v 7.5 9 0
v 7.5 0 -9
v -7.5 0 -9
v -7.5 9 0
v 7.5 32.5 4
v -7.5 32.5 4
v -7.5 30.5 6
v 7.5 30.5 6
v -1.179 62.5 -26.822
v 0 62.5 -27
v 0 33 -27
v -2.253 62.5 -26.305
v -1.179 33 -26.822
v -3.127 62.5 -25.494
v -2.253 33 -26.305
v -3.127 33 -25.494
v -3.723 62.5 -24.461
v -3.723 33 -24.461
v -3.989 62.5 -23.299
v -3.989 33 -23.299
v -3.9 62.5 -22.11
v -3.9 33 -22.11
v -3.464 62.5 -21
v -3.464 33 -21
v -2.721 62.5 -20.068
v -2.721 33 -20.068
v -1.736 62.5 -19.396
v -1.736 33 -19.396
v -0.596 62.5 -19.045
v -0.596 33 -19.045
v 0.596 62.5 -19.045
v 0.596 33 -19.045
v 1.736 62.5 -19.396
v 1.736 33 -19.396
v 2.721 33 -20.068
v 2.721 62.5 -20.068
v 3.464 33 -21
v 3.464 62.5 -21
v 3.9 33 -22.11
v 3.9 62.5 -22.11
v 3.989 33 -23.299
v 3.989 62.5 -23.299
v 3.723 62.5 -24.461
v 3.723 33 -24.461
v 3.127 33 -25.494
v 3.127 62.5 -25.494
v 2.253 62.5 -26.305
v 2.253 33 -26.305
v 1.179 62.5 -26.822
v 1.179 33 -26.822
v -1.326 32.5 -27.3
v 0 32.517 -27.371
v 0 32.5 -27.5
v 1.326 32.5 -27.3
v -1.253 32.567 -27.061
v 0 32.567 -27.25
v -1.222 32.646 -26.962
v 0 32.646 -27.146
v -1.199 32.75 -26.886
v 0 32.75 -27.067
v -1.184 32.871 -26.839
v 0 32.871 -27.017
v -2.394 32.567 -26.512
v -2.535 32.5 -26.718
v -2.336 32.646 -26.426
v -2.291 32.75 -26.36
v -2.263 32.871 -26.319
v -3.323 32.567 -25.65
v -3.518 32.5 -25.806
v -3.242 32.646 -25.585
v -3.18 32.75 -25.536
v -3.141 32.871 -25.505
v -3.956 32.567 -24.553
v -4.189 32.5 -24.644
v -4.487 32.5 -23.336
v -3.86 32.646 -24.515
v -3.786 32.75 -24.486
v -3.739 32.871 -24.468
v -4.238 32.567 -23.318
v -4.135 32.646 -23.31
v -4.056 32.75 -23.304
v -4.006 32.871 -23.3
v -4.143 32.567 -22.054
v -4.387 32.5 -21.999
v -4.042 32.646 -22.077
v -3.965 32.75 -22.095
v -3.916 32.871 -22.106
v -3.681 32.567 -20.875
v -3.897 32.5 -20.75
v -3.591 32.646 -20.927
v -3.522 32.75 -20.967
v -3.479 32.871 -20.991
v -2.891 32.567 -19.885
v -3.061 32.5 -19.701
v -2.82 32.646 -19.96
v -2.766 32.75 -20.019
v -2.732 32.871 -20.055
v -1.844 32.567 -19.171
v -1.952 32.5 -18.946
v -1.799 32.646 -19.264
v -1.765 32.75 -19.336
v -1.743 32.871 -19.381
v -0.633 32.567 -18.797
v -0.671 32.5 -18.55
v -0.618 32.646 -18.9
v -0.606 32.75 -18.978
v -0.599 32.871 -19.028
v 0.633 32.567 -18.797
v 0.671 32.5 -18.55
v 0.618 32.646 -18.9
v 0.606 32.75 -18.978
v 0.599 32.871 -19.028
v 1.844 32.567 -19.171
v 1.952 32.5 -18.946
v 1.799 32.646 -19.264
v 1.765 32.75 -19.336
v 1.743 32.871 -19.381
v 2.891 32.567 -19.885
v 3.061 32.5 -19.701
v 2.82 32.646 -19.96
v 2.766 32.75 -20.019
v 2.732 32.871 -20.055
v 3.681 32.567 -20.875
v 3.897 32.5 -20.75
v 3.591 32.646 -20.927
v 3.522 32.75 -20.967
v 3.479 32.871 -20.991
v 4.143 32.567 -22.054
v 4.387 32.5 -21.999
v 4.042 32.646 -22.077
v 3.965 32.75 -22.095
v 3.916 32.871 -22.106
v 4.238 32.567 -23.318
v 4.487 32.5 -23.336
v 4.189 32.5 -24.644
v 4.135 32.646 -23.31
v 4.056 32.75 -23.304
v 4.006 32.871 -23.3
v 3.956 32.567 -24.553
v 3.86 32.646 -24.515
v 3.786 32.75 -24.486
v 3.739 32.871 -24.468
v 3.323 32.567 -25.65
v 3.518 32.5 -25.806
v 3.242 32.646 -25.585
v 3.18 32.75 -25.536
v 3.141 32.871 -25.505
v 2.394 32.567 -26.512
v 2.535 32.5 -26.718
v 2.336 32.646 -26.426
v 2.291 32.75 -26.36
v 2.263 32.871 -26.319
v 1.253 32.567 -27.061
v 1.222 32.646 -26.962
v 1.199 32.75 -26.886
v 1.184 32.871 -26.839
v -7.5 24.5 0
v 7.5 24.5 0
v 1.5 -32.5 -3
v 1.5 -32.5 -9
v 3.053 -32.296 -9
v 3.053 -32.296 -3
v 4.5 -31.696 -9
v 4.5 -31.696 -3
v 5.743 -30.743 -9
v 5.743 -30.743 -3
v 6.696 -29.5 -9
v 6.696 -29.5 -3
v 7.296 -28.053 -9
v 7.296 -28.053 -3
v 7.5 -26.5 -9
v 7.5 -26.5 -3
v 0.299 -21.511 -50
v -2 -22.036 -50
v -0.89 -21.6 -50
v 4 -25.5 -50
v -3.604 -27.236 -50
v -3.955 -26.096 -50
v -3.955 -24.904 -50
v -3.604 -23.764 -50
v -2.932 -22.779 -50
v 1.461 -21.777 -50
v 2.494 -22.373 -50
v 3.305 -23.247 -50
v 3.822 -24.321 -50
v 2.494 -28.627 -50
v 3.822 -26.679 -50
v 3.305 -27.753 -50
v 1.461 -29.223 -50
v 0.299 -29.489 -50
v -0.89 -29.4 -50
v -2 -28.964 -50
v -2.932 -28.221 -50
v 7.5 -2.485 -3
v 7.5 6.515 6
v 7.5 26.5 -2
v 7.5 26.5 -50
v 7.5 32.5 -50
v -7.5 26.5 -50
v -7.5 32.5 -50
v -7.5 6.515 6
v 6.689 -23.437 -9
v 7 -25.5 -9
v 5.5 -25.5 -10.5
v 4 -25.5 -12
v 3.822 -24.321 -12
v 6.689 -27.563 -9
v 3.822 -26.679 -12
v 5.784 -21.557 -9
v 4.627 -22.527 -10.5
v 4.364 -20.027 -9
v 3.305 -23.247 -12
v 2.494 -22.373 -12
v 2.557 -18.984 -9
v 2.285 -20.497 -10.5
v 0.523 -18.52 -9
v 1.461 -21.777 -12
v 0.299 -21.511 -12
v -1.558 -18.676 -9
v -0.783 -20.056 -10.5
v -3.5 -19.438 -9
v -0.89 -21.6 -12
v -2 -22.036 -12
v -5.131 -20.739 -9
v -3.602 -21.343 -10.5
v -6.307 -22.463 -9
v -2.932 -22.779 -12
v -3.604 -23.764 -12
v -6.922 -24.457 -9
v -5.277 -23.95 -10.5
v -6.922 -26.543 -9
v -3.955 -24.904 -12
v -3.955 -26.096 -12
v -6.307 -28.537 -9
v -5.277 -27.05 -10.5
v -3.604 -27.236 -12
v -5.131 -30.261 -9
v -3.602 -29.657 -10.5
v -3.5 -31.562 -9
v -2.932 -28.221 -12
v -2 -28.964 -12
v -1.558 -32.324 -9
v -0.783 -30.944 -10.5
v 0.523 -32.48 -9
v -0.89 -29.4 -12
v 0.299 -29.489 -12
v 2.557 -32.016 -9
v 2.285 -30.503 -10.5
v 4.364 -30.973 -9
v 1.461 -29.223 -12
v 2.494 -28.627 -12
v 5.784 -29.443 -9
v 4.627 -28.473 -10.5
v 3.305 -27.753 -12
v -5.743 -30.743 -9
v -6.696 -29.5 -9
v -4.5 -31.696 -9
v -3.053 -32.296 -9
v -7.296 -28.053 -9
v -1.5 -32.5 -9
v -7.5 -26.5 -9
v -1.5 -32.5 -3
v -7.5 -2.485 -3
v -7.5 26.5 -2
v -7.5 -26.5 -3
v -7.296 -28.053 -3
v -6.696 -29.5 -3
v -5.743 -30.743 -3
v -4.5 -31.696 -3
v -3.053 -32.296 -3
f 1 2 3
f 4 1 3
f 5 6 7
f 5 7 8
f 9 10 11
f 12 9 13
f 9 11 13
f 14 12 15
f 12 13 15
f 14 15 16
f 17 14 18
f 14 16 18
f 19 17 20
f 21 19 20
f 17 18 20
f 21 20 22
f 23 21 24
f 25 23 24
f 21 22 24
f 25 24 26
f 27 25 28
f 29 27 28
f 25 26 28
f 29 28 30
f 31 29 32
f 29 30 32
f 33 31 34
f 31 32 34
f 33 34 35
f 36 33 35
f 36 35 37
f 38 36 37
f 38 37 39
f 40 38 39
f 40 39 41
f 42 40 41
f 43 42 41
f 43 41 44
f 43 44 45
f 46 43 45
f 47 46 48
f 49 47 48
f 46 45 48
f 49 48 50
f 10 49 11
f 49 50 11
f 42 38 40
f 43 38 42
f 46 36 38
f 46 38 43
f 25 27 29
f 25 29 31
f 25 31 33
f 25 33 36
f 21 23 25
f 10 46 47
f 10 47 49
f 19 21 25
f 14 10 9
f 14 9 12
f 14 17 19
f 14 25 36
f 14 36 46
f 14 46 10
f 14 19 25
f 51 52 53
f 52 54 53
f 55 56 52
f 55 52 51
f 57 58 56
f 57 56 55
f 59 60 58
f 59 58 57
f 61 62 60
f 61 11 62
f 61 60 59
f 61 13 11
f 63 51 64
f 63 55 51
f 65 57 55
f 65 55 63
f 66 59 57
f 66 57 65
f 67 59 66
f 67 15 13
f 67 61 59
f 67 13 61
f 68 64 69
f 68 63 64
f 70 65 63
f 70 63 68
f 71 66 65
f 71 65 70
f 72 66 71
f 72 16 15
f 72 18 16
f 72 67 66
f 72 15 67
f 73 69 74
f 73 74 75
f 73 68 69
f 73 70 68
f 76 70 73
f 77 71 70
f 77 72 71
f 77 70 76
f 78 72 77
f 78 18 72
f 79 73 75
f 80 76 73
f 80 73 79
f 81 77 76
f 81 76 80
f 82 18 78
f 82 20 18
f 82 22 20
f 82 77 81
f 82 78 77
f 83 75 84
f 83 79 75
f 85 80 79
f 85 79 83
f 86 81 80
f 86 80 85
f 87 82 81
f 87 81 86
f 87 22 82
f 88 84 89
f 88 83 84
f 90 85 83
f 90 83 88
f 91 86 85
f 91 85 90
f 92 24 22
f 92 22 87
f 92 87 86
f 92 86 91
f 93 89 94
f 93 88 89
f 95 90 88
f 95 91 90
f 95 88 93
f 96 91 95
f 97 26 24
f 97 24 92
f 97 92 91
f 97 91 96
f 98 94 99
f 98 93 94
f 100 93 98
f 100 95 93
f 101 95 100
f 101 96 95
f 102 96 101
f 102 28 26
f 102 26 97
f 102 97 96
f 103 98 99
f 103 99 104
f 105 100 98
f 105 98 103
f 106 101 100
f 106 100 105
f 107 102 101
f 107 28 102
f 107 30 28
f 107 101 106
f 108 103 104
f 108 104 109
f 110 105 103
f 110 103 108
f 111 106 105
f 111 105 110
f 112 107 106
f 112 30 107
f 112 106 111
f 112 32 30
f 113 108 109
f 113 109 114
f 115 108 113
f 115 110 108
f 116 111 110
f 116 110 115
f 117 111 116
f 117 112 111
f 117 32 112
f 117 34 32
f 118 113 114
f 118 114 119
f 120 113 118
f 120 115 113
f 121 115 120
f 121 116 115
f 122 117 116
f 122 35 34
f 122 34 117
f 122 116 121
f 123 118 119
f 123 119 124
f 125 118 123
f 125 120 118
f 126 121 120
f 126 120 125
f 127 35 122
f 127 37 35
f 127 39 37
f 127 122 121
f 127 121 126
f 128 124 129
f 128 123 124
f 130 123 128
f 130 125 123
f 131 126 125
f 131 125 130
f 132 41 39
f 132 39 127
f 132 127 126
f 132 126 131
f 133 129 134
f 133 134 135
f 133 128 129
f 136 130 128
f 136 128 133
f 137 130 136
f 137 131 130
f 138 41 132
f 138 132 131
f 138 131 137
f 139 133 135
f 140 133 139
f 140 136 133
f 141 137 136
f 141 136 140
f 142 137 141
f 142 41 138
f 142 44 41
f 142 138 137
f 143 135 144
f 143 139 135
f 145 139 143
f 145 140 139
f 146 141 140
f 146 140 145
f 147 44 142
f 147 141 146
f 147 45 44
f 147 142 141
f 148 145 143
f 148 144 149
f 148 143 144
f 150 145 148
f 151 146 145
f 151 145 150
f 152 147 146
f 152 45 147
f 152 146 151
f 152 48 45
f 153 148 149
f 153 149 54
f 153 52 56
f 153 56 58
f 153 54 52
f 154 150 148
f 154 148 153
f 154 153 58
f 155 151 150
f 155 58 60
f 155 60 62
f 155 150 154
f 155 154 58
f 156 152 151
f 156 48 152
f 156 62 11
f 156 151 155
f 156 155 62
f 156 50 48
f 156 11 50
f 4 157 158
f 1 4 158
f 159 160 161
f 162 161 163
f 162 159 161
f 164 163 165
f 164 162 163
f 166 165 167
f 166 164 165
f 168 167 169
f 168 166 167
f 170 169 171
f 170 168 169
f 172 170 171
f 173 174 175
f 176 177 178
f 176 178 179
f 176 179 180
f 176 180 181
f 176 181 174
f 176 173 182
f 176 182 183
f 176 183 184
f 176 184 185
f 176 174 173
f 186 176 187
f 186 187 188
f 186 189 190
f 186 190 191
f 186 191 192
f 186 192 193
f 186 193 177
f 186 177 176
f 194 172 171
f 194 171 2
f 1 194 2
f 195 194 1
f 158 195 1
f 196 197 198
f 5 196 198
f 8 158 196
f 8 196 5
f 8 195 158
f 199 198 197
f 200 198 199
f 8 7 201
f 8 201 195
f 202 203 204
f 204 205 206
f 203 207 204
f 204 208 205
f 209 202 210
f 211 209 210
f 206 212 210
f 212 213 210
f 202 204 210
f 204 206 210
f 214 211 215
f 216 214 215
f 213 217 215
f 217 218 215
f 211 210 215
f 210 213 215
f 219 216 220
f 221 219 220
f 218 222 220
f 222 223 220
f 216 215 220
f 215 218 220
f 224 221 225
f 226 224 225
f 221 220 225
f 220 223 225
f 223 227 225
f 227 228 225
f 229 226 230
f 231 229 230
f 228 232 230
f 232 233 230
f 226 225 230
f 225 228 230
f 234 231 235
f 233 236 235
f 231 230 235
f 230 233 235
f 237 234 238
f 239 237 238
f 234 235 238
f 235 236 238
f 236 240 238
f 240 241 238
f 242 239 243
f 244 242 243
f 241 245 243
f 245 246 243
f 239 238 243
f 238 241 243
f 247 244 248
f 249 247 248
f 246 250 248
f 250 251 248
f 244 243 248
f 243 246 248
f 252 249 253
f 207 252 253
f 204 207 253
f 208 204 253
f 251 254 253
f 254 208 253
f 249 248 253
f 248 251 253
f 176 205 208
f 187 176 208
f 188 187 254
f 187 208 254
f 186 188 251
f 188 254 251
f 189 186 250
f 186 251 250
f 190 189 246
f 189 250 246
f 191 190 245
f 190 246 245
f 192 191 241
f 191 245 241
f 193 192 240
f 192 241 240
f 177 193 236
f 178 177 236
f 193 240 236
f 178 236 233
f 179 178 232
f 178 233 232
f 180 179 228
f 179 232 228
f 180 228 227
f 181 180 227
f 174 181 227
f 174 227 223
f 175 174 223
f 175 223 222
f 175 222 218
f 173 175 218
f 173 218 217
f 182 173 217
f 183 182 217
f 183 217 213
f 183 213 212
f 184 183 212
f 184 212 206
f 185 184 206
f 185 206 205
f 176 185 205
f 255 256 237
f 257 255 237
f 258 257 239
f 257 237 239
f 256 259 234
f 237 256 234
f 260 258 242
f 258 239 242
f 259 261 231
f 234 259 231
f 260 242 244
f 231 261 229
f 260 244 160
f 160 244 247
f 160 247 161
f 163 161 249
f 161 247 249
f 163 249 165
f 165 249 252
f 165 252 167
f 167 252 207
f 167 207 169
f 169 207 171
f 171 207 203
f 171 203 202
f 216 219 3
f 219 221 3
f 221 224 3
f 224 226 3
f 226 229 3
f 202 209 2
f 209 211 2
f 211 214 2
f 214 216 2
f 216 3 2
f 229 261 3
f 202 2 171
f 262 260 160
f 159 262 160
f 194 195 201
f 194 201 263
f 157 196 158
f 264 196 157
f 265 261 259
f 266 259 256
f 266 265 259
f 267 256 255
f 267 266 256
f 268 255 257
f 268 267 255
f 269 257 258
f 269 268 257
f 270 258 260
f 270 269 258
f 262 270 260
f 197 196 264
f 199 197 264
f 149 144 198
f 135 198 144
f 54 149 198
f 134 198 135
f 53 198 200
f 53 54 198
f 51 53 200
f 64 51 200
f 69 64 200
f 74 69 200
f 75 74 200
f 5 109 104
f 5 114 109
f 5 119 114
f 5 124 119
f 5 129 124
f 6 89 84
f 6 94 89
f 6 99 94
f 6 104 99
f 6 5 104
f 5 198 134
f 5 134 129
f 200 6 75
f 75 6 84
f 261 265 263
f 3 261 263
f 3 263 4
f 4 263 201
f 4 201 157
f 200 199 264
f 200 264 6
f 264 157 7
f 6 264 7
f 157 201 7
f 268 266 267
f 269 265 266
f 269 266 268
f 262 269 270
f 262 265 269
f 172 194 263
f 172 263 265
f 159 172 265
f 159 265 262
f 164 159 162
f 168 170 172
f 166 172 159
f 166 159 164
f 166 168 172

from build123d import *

# Parameters (mm, degrees)
CROQUIS1_W     = 15
CROQUIS1_H     = 65
EXTRUIR1_DEPTH = 6
CROQUIS2_W     = 15
CROQUIS2_H     = 6
EXTRUIR2_DEPTH = 50
CHAFL_N1_SIZE  = 2
CROQUIS3_R     = 4
EXTRUIR3_DEPTH = 50
CHAFL_N2_SIZE  = 3
REDONDEO1_R    = 6
CROQUIS4_R     = 4
EXTRUIR4_DEPTH = 30
REDONDEO2_R    = 0.5
EXTRUIR5_DEPTH = 15
CHAFL_N3_SIZE  = 9
EXTRUIR6_DEPTH = 15
CHAFL_N4_SIZE  = 3


with BuildPart() as part:
    # Croquis1 → Extruir1 (new body)
    with BuildSketch(Plane.XY):
        Rectangle(CROQUIS1_W, CROQUIS1_H)
    extrude(amount=EXTRUIR1_DEPTH)

    # Croquis2 → Extruir2 (add)
    with BuildSketch(Plane(origin=(0, 0, 0), x_dir=(-1, 0, 0), z_dir=(0, 0, -1))):
        with Locations((0, 29.5)):
            Rectangle(CROQUIS2_W, CROQUIS2_H)
    extrude(amount=EXTRUIR2_DEPTH)

    # Chaflán1
    chafl_n1_edges = [part.edges().sort_by_distance(p)[0] for p in [
        (0, 32.5, 6),
        (0, 26.5, 0),
    ]]
    chamfer(chafl_n1_edges, length=CHAFL_N1_SIZE)

    # Croquis3 → Extruir3 (add)
    with BuildSketch(Plane(origin=(0, 0, 0), x_dir=(-1, 0, 0), z_dir=(0, 0, -1))):
        with Locations(Location((0, -25.5, 0), (0, 0, 180))):
            Circle(CROQUIS3_R)
    extrude(amount=EXTRUIR3_DEPTH)

    # Chaflán2
    chafl_n2_edges = [part.edges().sort_by_distance(p)[0] for p in [
        (-4, -25.5, 0),
    ]]
    chamfer(chafl_n2_edges, length=CHAFL_N2_SIZE - 0.0001)  # a hair under: the kernel refuses the full size

    # Redondeo1
    redondeo1_edges = [part.edges().sort_by_distance(p)[0] for p in [
        (-7.5, -32.5, 3),
        (7.5, -32.5, 3),
    ]]
    fillet(redondeo1_edges, radius=REDONDEO1_R)

    # Croquis4 → Extruir4 (add)
    with BuildSketch(Plane(origin=(0, 32.5, 0), x_dir=(1, 0, 0), z_dir=(0, 1, 0))):
        with Locations(Location((0, 23, 0), (0, 0, 90))):
            Circle(CROQUIS4_R)
    extrude(amount=EXTRUIR4_DEPTH)

    # Redondeo2
    redondeo2_edges = [part.edges().sort_by_distance(p)[0] for p in [
        (0, 32.5, -19),
    ]]
    fillet(redondeo2_edges, radius=REDONDEO2_R)

    # Croquis6 → Extruir5 (add)
    with BuildSketch(Plane.XY.offset(6)):
        with BuildLine():
            Line((7.5, 0), (-7.5, 0))
            Line((-7.5, 0), (-7.5, -26.5))
            ThreePointArc((-7.5, -26.5), (-5.742640687, -30.742640687), (-1.5, -32.5))
            Line((-1.5, -32.5), (1.5, -32.5))
            ThreePointArc((1.5, -32.5), (5.742640687, -30.742640687), (7.5, -26.5))
            Line((7.5, -26.5), (7.5, 0))
        make_face()
    extrude(amount=-EXTRUIR5_DEPTH)

    # Chaflán3
    chafl_n3_edges = [part.edges().sort_by_distance(p)[0] for p in [
        (0, 0, 0),
    ]]
    chamfer(chafl_n3_edges, length=CHAFL_N3_SIZE - 0.0001)  # a hair under: the kernel refuses the full size

    # Croquis7 → Extruir6 (cut)
    with BuildSketch(Plane(origin=(7.5, 0, 0), x_dir=(0, 0, -1), z_dir=(1, 0, 0))):
        Polygon((-6, 6.514718626), (3, -2.485281374), (3, -32.5), (-11.901527466, -39.580751492), align=None)
    extrude(amount=-EXTRUIR6_DEPTH, mode=Mode.SUBTRACT)

    # Chaflán4
    chafl_n4_edges = [part.edges().sort_by_distance(p)[0] for p in [
        (-4, -25.5, -9),
    ]]
    chamfer(chafl_n4_edges, length=CHAFL_N4_SIZE - 0.0001)  # a hair under: the kernel refuses the full size


solid = part.part
